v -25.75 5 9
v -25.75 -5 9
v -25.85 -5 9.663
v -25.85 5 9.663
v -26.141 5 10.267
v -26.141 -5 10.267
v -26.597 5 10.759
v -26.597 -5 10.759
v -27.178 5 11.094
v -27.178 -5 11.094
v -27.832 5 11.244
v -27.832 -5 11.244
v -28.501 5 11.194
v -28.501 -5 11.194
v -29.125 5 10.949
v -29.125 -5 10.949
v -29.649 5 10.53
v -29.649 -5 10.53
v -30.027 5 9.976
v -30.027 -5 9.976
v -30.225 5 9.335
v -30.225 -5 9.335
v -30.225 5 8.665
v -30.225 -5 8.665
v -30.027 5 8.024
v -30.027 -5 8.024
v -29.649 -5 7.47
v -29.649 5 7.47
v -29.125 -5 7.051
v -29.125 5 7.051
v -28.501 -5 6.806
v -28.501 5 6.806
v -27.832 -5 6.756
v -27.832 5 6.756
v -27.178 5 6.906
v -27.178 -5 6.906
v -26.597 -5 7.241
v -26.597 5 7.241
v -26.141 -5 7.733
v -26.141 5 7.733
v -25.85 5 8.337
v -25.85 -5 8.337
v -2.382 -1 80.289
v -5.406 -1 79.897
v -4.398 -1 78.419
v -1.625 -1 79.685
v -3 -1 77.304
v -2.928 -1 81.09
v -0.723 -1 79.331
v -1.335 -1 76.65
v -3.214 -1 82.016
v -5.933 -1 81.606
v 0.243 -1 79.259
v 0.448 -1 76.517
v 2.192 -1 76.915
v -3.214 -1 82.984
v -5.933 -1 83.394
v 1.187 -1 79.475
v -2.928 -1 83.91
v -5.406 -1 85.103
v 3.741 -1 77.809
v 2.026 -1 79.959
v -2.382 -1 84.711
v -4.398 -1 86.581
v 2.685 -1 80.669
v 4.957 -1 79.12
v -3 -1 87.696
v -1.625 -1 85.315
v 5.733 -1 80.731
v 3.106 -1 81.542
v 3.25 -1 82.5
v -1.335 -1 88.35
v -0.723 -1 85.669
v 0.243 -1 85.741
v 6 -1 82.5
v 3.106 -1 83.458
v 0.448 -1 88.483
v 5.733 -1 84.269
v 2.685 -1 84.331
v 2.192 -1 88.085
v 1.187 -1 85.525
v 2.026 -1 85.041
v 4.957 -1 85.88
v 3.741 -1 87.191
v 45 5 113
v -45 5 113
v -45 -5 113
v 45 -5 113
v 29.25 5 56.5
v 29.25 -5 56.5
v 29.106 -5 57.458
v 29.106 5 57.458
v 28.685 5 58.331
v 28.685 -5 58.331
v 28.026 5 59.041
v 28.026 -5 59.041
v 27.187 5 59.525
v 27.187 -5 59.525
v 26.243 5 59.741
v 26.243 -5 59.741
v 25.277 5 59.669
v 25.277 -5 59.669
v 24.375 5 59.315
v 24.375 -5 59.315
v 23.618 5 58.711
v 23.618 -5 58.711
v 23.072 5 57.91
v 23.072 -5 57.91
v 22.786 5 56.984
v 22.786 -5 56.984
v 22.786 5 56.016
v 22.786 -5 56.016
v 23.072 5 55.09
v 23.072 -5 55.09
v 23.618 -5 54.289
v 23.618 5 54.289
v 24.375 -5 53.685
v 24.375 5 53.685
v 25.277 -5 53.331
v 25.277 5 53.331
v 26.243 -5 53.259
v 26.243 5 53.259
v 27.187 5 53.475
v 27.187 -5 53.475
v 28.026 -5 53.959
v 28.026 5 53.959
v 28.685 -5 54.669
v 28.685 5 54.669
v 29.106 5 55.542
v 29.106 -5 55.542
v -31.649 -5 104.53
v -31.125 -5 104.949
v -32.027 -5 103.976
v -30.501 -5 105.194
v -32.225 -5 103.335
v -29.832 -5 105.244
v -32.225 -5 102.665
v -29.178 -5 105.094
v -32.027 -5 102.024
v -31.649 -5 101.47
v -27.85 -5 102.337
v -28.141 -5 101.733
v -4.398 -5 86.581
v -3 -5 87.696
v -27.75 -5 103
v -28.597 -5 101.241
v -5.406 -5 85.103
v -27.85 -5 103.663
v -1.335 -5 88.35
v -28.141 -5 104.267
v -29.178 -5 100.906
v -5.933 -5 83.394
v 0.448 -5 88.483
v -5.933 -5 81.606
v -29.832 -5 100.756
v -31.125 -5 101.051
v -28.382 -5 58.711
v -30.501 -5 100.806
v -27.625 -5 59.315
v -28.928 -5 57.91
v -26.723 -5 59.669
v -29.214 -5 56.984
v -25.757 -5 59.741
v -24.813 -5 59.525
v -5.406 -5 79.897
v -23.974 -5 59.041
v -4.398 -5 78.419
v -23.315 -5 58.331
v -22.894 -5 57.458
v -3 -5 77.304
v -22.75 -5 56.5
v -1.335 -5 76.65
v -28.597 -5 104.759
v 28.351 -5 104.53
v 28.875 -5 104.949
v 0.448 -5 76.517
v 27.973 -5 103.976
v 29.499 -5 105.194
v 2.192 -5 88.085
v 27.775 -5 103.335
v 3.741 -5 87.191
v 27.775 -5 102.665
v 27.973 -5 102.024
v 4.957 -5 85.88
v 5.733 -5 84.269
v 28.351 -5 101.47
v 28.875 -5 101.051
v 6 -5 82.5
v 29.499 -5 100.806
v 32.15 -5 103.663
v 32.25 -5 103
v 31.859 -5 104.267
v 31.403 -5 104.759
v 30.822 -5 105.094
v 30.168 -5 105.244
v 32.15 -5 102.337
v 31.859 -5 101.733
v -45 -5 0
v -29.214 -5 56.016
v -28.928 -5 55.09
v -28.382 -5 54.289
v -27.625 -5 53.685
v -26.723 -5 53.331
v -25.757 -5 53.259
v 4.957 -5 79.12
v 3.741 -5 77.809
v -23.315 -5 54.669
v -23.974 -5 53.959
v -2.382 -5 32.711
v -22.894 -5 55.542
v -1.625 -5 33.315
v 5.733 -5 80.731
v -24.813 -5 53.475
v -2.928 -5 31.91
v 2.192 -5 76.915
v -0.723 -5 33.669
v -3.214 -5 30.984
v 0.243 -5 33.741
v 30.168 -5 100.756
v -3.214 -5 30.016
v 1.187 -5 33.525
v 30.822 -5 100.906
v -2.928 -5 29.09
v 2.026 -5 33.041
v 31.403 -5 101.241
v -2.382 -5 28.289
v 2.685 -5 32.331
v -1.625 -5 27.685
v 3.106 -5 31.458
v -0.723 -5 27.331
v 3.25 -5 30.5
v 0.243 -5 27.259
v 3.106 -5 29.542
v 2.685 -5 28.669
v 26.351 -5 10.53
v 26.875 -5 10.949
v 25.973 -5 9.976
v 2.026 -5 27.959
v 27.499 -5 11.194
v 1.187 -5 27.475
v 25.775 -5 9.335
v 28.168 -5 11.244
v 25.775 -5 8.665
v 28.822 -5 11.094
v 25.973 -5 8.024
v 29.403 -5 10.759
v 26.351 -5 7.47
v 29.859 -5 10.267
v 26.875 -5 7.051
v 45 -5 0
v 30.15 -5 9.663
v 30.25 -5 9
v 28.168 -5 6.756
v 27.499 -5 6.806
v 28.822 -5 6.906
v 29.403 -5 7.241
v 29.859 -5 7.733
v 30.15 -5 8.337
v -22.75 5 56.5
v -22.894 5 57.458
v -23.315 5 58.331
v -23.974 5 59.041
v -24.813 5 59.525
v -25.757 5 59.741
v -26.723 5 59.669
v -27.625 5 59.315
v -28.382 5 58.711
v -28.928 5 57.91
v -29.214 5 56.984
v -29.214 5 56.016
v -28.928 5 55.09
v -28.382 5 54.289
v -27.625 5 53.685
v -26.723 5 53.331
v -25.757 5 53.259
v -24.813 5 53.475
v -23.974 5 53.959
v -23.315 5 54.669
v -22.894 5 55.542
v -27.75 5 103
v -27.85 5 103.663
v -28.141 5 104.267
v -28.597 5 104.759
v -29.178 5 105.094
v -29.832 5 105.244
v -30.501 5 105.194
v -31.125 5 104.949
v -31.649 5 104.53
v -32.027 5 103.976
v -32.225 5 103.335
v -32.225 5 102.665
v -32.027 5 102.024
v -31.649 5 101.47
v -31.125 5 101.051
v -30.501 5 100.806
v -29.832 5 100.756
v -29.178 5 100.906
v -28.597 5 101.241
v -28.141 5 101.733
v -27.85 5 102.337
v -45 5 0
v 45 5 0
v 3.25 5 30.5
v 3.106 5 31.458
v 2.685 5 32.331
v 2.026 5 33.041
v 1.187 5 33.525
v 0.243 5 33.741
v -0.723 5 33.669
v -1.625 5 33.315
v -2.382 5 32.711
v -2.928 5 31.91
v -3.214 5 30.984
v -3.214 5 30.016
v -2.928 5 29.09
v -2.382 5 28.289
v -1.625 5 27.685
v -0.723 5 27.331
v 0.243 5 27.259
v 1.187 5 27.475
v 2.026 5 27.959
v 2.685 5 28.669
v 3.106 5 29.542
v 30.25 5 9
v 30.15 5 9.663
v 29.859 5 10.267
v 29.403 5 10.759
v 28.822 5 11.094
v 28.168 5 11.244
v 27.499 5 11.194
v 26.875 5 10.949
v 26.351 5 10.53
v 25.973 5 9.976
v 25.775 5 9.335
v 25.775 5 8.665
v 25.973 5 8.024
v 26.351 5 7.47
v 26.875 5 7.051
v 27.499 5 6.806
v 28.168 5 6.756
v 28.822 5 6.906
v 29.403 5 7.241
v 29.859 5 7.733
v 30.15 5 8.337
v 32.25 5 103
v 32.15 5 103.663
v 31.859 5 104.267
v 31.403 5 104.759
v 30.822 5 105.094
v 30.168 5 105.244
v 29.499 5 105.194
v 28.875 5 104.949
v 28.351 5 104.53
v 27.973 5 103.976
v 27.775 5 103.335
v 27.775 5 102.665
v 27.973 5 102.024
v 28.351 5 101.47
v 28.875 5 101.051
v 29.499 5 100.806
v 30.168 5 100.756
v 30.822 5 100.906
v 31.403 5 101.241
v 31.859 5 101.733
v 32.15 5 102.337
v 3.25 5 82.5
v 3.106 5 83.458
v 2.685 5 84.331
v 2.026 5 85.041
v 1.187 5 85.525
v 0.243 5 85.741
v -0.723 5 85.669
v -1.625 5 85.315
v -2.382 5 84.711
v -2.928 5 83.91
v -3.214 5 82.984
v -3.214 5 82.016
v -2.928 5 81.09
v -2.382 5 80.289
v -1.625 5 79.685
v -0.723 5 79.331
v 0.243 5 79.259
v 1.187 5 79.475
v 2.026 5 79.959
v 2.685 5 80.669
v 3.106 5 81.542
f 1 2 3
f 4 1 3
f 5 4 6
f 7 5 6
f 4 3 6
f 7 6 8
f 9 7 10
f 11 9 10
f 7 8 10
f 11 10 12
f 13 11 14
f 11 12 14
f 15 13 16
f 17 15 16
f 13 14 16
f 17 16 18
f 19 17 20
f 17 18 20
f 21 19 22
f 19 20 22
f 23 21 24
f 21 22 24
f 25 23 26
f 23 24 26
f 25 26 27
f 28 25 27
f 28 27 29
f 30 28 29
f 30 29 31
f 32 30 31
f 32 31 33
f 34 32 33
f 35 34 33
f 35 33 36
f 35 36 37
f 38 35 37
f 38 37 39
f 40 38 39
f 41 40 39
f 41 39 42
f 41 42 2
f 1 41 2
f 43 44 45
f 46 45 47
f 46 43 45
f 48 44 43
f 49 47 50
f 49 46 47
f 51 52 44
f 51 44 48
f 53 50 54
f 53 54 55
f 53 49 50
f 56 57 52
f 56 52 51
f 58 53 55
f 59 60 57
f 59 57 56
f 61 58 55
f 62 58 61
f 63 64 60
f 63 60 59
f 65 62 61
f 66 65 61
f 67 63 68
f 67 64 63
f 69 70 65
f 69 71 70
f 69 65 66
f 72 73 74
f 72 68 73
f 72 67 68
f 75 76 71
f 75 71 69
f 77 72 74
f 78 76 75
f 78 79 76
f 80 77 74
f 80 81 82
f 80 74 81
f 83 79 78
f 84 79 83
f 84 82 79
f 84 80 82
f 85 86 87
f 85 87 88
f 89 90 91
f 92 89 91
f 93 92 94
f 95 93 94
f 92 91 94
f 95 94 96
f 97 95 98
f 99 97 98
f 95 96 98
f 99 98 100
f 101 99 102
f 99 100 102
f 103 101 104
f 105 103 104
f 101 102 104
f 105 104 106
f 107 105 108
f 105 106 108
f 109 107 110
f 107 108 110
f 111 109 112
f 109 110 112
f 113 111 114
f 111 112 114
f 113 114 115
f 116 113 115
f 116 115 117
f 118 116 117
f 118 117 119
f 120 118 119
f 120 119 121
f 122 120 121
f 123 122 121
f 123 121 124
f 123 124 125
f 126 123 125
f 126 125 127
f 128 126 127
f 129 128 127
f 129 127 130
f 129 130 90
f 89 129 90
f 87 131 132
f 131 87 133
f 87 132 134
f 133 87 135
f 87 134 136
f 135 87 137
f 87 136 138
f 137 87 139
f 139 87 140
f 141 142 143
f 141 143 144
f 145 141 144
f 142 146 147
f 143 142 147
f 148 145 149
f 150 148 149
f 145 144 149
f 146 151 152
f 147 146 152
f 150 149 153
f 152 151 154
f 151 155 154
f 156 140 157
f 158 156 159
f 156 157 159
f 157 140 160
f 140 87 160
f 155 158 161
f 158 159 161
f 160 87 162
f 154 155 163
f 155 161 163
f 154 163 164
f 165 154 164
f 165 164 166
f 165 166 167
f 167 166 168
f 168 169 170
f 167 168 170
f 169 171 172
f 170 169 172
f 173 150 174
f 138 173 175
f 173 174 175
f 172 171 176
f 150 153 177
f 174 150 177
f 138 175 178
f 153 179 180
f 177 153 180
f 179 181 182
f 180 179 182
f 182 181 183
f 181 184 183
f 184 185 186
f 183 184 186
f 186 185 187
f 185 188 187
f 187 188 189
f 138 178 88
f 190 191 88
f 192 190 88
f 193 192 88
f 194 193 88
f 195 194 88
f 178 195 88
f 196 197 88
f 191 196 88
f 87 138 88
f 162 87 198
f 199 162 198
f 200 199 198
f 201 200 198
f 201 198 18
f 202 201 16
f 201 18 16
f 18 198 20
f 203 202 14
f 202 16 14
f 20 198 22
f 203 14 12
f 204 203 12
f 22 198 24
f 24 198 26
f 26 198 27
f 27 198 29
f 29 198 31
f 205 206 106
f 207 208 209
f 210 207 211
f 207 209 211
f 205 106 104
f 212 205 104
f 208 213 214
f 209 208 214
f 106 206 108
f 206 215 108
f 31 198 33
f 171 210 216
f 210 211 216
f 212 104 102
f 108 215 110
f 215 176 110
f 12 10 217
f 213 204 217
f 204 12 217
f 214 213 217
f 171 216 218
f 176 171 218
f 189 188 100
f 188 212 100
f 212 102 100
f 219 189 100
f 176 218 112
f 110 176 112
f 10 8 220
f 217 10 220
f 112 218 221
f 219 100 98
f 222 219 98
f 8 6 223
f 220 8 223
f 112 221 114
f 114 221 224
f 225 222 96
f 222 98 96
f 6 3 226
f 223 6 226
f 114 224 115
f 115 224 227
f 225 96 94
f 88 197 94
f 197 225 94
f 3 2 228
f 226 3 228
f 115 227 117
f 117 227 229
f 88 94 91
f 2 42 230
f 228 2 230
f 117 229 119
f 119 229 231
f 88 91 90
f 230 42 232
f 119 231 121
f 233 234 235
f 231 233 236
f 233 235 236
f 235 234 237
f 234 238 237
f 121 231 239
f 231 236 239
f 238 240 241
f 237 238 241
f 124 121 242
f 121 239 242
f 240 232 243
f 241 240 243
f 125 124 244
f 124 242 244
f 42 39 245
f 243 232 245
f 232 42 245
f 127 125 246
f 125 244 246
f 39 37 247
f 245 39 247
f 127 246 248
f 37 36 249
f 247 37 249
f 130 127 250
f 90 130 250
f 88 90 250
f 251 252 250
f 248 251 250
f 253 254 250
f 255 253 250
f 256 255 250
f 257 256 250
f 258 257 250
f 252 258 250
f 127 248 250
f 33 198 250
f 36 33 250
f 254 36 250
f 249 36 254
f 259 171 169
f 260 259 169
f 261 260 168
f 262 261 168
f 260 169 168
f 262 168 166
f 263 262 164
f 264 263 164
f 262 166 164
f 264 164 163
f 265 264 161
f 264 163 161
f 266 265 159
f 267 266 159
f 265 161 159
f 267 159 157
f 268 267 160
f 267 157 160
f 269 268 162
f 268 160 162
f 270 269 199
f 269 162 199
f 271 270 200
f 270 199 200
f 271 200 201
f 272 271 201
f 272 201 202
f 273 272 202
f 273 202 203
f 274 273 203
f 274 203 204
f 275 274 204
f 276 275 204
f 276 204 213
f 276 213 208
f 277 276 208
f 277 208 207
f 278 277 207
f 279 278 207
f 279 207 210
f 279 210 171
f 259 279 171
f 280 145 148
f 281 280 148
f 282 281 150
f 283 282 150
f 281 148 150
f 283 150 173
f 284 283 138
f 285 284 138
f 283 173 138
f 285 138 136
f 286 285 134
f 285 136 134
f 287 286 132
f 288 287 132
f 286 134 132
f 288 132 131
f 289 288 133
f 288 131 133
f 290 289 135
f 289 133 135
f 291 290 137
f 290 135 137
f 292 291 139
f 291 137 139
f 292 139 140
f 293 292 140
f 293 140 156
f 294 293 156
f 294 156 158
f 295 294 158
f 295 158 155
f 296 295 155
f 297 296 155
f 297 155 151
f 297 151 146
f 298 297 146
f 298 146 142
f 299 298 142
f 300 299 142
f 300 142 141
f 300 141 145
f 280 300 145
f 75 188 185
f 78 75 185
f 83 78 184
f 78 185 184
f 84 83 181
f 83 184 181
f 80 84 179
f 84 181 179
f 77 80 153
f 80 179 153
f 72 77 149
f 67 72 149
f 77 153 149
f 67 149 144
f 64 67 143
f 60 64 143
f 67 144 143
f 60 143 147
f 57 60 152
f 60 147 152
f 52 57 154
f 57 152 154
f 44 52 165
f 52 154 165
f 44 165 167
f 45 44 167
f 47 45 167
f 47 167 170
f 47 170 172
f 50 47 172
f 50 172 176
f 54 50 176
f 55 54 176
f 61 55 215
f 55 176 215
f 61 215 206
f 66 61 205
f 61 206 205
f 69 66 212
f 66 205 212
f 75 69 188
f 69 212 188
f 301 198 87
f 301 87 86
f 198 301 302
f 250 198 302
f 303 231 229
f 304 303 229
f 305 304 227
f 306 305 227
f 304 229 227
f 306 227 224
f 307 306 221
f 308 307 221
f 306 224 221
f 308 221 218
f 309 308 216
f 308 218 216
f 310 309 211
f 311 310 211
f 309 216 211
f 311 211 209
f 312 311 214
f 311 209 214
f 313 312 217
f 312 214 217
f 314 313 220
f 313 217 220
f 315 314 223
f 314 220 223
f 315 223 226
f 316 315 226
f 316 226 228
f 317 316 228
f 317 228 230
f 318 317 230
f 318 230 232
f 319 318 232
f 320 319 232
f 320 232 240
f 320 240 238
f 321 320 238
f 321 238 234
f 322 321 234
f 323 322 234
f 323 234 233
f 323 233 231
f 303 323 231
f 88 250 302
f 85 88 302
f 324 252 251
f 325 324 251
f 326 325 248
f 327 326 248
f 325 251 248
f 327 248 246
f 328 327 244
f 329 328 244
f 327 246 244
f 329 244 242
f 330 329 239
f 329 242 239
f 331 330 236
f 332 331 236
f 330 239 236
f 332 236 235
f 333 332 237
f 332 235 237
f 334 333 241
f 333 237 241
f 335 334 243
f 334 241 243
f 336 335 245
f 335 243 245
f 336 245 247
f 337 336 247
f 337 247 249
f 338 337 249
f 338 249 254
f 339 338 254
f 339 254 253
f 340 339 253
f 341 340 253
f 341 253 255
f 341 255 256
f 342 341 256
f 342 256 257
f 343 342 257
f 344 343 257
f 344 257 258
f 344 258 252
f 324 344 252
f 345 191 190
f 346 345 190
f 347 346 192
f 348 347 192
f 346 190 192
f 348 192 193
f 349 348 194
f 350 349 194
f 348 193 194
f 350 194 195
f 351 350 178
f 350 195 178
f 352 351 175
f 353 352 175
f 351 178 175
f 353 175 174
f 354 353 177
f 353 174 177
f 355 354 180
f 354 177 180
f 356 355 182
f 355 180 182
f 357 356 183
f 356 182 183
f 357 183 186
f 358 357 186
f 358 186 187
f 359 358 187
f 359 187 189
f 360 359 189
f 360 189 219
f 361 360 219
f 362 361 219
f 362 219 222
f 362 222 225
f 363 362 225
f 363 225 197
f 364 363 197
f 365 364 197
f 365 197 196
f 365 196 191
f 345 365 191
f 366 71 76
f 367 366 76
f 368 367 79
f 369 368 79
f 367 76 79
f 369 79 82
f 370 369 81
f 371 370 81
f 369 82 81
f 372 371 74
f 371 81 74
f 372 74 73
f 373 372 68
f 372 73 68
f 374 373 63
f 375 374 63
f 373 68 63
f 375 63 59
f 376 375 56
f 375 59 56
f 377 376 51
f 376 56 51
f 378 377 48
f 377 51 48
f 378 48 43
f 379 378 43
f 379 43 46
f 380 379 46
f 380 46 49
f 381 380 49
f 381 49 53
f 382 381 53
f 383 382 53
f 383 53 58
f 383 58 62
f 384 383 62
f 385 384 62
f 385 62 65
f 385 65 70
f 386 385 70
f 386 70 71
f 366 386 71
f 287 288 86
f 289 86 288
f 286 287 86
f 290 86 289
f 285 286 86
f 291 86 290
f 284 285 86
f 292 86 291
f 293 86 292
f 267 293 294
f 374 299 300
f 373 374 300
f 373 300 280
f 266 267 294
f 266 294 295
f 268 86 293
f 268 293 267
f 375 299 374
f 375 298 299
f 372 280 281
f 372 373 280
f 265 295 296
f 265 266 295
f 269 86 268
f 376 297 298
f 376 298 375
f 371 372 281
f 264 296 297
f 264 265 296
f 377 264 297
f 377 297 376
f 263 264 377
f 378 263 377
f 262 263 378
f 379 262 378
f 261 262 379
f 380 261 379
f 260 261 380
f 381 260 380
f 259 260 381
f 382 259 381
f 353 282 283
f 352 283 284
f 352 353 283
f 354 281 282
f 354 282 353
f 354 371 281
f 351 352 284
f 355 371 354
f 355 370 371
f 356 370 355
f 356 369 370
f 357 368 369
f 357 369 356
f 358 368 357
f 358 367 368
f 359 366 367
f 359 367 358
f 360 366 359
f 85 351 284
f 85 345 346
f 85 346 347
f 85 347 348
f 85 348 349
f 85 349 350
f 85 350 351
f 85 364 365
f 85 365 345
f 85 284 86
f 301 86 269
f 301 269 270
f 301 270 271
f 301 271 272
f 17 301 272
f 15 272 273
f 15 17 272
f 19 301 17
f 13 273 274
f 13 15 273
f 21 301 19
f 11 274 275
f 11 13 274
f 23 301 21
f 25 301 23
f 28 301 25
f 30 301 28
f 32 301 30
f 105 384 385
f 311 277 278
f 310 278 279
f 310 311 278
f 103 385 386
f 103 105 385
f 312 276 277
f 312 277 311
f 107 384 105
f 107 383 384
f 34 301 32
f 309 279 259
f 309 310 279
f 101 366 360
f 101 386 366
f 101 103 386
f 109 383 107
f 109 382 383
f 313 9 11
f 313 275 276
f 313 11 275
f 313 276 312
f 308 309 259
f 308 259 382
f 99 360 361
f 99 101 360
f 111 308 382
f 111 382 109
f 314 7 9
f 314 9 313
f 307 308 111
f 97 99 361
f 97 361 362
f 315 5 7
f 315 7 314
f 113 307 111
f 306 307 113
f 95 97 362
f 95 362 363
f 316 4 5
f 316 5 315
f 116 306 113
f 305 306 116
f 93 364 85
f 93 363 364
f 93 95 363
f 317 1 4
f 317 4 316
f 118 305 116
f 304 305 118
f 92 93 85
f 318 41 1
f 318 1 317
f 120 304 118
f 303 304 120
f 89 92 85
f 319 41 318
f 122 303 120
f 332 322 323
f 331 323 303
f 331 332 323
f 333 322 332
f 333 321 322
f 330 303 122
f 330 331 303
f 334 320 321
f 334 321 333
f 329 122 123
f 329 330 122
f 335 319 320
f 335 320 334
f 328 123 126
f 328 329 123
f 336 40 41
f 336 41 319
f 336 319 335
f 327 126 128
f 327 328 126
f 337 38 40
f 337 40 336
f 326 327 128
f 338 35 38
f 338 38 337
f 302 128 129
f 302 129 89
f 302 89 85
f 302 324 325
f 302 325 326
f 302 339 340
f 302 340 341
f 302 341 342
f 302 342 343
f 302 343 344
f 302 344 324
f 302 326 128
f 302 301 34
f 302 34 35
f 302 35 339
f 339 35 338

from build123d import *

# Parameters (mm, degrees)
SKETCH_W        = 90
SKETCH_H        = 10
PAD_DEPTH       = 113
SKETCH001_R     = 2.25
SKETCH001_R_2   = 3.25
POCKET_DEPTH    = 10.001
SKETCH002_R     = 6
POCKET001_DEPTH = 4


with BuildPart() as part:
    # Sketch → Pad (new body)
    with BuildSketch(Plane.XY):
        Rectangle(SKETCH_W, SKETCH_H)
    extrude(amount=PAD_DEPTH)

    # Sketch001 → Pocket (cut, through all)
    with BuildSketch(Plane.XZ.offset(5)):
        with Locations((-30, 103)):
            Circle(SKETCH001_R)
        with Locations((30, 103)):
            Circle(SKETCH001_R)
        with Locations((28, 9)):
            Circle(SKETCH001_R)
        with Locations((-28, 9)):
            Circle(SKETCH001_R)
        with Locations((0, 82.5)):
            Circle(SKETCH001_R_2)
        with Locations((0, 30.5)):
            Circle(SKETCH001_R_2)
        with Locations((26, 56.5)):
            Circle(SKETCH001_R_2)
        with Locations((-26, 56.5)):
            Circle(SKETCH001_R_2)
    extrude(amount=-POCKET_DEPTH, mode=Mode.SUBTRACT)

    # Sketch002 → Pocket001 (cut)
    with BuildSketch(Plane.XZ.offset(5)):
        with Locations((0, 82.5)):
            Circle(SKETCH002_R)
    extrude(amount=-POCKET001_DEPTH, mode=Mode.SUBTRACT)


solid = part.part
